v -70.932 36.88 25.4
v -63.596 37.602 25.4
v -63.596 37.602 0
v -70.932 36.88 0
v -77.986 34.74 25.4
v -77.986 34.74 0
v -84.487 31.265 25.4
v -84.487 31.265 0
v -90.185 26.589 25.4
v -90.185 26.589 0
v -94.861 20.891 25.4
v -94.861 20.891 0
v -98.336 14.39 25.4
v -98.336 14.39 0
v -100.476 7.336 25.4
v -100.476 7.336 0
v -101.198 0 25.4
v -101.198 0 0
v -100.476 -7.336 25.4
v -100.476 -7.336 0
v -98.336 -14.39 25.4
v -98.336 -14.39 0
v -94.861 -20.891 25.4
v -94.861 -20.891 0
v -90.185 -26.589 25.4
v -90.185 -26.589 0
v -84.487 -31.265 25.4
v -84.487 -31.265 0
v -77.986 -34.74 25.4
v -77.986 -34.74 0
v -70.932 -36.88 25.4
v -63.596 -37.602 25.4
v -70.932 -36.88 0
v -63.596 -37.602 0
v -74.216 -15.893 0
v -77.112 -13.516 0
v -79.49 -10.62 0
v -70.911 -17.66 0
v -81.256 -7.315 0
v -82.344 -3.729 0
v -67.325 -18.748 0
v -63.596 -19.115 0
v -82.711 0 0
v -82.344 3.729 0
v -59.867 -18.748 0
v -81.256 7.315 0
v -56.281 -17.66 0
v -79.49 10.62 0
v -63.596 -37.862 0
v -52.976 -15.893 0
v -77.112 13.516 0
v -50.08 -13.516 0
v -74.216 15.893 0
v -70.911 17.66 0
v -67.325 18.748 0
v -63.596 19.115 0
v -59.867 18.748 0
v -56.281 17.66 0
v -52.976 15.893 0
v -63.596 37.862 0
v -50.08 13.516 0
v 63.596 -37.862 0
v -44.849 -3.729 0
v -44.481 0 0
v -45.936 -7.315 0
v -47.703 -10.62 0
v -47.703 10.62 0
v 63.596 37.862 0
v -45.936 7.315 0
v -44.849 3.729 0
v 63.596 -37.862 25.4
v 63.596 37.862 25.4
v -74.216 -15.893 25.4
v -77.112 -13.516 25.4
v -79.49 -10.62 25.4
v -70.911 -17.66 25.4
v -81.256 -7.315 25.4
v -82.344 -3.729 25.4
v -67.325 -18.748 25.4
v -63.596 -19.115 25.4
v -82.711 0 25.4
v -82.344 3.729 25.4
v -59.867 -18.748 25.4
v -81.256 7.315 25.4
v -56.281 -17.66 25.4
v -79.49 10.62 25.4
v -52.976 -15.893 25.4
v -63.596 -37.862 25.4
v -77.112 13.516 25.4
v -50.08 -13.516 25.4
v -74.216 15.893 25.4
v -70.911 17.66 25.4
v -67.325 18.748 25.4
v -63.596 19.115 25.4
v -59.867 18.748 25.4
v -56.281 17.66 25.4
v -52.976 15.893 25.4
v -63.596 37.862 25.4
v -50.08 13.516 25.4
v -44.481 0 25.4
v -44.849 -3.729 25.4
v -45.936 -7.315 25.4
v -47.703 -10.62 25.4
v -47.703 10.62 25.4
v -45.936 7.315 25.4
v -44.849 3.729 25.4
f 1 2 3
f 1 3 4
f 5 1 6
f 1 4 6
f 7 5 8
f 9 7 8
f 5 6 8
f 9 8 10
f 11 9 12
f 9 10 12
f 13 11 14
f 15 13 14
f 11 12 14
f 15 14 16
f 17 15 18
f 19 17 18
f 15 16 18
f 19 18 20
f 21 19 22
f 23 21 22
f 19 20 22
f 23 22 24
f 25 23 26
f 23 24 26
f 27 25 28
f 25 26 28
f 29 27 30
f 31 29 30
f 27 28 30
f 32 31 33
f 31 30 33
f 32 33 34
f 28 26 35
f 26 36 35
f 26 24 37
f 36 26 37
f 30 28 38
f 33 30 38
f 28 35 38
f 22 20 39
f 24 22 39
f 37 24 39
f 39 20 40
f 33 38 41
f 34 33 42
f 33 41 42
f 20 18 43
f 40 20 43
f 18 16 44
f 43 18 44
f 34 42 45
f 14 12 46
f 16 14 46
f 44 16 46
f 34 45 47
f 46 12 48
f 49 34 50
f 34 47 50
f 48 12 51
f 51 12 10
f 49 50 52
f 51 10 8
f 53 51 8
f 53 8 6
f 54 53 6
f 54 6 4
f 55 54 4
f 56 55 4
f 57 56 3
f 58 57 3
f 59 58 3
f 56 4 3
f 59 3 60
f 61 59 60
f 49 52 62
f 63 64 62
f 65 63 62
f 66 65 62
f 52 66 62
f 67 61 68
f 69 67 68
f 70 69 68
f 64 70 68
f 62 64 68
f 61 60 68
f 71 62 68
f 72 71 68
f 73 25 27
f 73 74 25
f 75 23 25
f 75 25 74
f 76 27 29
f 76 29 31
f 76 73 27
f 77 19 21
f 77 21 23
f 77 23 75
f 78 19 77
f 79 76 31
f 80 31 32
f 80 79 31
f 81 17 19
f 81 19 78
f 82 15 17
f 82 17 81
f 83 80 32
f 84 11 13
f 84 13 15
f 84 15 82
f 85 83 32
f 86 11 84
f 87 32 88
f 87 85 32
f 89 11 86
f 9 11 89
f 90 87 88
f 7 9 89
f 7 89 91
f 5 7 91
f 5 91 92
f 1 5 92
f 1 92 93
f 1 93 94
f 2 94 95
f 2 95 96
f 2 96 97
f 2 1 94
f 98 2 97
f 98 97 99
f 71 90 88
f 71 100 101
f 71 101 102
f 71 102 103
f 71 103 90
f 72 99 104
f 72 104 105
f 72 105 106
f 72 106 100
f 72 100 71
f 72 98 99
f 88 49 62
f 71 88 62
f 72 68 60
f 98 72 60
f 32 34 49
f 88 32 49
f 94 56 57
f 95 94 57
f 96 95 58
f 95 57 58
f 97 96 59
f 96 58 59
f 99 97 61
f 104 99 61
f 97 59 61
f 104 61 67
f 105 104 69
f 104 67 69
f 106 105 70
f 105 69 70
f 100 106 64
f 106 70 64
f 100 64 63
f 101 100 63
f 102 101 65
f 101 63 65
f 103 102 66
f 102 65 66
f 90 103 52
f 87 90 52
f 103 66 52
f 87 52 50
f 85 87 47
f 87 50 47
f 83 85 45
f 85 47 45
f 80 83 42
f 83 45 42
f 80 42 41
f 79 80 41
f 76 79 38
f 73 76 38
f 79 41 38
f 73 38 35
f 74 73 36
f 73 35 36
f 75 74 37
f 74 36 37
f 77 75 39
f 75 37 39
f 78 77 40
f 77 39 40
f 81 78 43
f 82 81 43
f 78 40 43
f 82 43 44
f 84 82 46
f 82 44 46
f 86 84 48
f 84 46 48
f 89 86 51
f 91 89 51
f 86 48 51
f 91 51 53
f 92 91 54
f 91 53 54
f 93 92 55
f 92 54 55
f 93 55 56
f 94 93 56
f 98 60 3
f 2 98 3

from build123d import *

# Parameters (mm, degrees)
F1_DEPTH = 25.4


with BuildPart() as f1:
    # F0 (on Top) → F1 (new body)
    with BuildSketch(Plane.XY):
        with BuildLine():
            Line((-63.5961517692, -37.6021821231), (-63.5961517692, -37.8618910909))
            Line((-63.5961517692, -37.8618910909), (63.5961517692, -37.8618910909))
            Line((63.5961517692, -37.8618910909), (63.5961517692, 37.8618910909))
            Line((63.5961517692, 37.8618910909), (-63.5961517692, 37.8618910909))
            Line((-63.5961517692, 37.8618910909), (-63.5961517692, 37.6021821231))
            ThreePointArc((-63.5961517692, 37.6021821231), (-37.0073938025, 26.5887579667), (-25.993969646, 0))
            ThreePointArc((-25.993969646, 0), (-37.0073938025, -26.5887579667), (-63.5961517692, -37.6021821231))
        make_face()
        with BuildLine():
            ThreePointArc((-63.5961517692, 37.6021821231), (-101.1983338923, 0), (-63.5961517692, -37.6021821231))
            Line((-63.5961517692, -37.6021821231), (-63.5961517692, -19.1149251528))
            ThreePointArc((-63.5961517692, -19.1149251528), (-82.711076922, 0), (-63.5961517692, 19.1149251528))
            Line((-63.5961517692, 19.1149251528), (-63.5961517692, 37.6021821231))
        make_face()
        with BuildLine():
            Line((-63.5961517692, -19.1149251528), (-63.5961517692, -37.6021821231))
            ThreePointArc((-63.5961517692, -37.6021821231), (-37.0073938025, -26.5887579667), (-25.993969646, 0))
            ThreePointArc((-25.993969646, 0), (-37.0073938025, 26.5887579667), (-63.5961517692, 37.6021821231))
            Line((-63.5961517692, 37.6021821231), (-63.5961517692, 19.1149251528))
            ThreePointArc((-63.5961517692, 19.1149251528), (-50.0798585717, 13.5162931974), (-44.4812266163, 0))
            ThreePointArc((-44.4812266163, 0), (-50.0798585717, -13.5162931974), (-63.5961517692, -19.1149251528))
        make_face()
    extrude(amount=F1_DEPTH)


solid = f1.part
